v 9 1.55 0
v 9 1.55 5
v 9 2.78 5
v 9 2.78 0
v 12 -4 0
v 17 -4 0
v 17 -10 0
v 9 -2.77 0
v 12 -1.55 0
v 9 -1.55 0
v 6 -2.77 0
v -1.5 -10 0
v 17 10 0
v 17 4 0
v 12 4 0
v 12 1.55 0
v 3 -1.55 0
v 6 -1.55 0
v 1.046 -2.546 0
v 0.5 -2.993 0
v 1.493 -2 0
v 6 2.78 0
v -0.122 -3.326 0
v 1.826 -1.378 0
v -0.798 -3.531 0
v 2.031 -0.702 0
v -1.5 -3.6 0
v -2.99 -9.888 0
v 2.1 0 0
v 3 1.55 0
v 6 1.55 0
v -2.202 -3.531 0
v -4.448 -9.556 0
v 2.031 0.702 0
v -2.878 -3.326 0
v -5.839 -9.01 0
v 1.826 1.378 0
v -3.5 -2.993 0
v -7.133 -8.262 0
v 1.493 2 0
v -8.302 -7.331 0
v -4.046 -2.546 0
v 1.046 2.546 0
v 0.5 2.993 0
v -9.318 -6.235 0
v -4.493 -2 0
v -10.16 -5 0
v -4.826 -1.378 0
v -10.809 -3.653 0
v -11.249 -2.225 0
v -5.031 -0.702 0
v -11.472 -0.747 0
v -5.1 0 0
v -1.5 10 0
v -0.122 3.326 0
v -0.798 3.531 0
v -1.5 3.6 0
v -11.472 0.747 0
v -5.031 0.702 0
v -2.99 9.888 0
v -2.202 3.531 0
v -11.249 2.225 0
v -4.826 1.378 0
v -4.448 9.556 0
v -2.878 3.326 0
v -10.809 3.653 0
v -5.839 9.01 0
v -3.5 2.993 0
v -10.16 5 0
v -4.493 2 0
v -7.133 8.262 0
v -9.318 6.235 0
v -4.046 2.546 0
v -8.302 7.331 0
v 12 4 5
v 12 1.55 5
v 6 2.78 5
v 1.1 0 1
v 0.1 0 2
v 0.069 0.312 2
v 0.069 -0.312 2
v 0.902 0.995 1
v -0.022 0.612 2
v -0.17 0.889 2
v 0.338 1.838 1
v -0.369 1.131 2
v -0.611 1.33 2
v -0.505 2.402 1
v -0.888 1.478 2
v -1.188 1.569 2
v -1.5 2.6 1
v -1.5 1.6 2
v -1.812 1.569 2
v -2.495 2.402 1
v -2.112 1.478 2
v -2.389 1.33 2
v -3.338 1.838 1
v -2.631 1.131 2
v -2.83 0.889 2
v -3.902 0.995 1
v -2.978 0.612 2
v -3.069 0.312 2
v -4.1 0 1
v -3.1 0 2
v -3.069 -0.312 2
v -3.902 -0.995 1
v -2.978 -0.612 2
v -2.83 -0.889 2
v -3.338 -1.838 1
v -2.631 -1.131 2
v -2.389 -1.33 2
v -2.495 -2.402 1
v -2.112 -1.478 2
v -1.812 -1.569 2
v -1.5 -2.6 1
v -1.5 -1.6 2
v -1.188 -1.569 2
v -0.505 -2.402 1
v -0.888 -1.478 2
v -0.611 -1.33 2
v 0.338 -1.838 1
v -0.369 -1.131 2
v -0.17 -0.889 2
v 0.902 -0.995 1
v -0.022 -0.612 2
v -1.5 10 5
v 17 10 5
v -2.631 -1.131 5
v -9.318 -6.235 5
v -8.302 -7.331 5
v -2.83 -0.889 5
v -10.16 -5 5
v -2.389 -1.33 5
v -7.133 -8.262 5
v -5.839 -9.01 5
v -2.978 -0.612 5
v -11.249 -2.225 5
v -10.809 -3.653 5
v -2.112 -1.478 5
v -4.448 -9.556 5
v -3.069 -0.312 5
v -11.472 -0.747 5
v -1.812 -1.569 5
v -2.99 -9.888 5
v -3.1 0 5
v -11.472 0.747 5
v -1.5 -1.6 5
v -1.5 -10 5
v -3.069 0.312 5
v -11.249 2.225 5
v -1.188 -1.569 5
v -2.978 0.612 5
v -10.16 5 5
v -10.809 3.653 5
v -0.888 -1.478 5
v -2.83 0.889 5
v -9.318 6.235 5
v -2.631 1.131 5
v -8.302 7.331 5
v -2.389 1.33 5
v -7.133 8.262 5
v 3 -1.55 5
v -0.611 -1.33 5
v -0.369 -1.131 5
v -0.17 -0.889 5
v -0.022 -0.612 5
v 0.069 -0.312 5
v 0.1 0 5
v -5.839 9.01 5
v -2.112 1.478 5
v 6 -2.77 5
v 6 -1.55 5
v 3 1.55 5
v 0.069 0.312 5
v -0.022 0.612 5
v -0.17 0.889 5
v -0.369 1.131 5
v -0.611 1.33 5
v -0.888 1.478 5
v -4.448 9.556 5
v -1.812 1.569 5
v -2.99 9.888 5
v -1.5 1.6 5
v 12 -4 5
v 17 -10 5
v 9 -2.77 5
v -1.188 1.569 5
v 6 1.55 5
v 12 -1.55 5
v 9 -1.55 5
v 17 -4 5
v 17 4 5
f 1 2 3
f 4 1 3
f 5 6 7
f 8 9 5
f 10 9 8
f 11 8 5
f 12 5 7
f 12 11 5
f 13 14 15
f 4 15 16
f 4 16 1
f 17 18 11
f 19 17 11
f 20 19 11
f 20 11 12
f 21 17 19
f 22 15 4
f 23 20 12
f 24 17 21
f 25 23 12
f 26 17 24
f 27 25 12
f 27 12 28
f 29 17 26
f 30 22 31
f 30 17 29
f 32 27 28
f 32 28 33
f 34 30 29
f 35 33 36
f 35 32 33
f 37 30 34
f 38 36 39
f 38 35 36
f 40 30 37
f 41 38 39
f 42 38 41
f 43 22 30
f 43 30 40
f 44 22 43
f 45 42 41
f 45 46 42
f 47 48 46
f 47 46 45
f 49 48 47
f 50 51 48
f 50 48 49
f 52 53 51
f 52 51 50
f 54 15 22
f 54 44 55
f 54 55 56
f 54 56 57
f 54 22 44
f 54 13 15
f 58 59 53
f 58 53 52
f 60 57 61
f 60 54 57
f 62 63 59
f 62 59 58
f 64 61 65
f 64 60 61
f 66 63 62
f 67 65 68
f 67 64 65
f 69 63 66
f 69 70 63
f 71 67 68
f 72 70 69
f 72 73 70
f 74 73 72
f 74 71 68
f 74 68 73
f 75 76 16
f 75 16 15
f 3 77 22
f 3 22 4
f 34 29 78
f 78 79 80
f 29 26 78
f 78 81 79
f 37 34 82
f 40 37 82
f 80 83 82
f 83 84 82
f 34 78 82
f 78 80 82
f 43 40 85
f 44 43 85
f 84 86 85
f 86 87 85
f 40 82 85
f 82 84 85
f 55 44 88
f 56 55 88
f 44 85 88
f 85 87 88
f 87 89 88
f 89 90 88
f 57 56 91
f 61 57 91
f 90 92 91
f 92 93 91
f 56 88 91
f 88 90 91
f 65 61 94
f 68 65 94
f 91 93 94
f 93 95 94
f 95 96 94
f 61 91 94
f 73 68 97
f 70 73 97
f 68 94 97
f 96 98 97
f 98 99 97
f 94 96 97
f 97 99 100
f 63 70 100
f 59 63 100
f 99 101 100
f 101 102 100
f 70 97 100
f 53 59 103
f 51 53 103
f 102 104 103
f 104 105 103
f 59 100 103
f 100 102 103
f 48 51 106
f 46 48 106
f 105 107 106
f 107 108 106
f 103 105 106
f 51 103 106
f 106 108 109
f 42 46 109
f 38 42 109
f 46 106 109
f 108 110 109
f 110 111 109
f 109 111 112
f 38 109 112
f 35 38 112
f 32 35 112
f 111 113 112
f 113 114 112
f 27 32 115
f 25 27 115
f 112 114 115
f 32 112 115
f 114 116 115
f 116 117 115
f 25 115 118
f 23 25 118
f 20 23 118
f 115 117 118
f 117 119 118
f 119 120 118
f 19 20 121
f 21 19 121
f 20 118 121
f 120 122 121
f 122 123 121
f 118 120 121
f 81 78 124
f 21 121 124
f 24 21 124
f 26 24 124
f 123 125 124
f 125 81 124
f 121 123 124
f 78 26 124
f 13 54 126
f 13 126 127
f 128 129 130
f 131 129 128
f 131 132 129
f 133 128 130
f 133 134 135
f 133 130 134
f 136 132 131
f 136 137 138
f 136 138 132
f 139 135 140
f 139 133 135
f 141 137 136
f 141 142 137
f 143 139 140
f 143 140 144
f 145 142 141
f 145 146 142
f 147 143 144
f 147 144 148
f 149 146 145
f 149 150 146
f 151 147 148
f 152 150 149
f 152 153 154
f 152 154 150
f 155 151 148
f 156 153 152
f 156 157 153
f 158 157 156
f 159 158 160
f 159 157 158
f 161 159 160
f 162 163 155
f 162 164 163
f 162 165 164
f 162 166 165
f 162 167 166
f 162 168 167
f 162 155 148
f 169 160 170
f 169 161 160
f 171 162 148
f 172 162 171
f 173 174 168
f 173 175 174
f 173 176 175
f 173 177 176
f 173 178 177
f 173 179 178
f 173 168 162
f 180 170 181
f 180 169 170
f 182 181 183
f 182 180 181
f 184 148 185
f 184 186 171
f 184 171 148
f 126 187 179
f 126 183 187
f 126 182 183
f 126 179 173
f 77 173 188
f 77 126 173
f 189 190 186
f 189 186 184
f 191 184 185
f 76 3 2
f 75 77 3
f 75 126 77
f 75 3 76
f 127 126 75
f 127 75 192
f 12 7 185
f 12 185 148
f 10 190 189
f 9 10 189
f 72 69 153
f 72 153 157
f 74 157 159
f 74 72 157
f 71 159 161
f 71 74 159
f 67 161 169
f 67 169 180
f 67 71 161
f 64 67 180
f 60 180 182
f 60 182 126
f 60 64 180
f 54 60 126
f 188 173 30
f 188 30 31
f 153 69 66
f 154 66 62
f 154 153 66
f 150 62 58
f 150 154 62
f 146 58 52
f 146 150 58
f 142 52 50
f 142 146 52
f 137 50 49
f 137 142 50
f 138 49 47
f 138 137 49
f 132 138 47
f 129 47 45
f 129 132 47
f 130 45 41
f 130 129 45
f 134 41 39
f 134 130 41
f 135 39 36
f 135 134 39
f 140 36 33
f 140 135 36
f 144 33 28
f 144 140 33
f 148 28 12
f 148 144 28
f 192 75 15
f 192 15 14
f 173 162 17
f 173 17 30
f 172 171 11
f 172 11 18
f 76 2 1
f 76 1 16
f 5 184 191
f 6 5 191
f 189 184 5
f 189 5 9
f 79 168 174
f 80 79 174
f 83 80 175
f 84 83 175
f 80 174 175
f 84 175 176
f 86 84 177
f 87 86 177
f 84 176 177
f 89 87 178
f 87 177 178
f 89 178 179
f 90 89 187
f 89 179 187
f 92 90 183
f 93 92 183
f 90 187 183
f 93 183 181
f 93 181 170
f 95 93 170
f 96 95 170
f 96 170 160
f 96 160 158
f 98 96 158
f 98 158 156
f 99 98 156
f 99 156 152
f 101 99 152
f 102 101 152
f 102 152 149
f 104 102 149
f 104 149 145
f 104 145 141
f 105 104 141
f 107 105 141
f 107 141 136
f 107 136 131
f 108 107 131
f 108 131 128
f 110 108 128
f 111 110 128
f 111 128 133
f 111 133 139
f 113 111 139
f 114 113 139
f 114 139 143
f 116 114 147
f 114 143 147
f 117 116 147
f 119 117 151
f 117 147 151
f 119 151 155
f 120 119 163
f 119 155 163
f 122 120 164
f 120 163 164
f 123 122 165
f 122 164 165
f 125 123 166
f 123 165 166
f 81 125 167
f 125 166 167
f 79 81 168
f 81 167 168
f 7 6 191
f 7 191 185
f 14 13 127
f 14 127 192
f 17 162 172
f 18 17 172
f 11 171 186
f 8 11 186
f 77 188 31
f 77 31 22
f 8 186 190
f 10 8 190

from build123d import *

# Parameters (mm, degrees)
BOSS_EXTRU_1_DEPTH                  = 5
ESQUISSE2_W                         = 5
ESQUISSE2_H                         = 8
ENL_V_MAT_EXTRU_1_DEPTH             = 6
ENL_V_MAT_EXTRU_2_DEPTH             = 2.5
DIAM_TRE_DU_PER_AGE_2_5_2_5_2_D     = 2.5
DIAM_TRE_DU_PER_AGE_2_5_2_5_2_DEPTH = 2.5
ESQUISSE9_W                         = 8.5
ESQUISSE9_H                         = 10
BOSS_EXTRU_2_DEPTH                  = 5
ESQUISSE10_R                        = 1.6
ESQUISSE10_W                        = 9
ESQUISSE10_H                        = 3.1
ESQUISSE10_W_2                      = 3
ESQUISSE10_H_2                      = 5.55
ENL_V_MAT_EXTRU_3_DEPTH             = 6
CHANFREIN1_SIZE                     = 2


with BuildPart() as part:
    # Esquisse1 → Boss.-Extru.1 (new body)
    with BuildSketch(Plane(origin=(0, 0, 0), x_dir=(-1, 0, 0), z_dir=(0, 0, -1))):
        with BuildLine():
            Line((-17, 10), (-17, -10))
            Line((-17, -10), (1.5, -10))
            ThreePointArc((1.5, -10), (11.5, 0), (1.5, 10))
            Line((1.5, 10), (-17, 10))
        make_face()
    extrude(amount=-BOSS_EXTRU_1_DEPTH)

    # Esquisse2 → Enlèv. mat.-Extru.1 (cut, through all)
    with BuildSketch(Plane.XY.offset(5)):
        with Locations((14.5, 0)):
            Rectangle(ESQUISSE2_W, ESQUISSE2_H)
    extrude(amount=-ENL_V_MAT_EXTRU_1_DEPTH, mode=Mode.SUBTRACT)

    # Esquisse3 → Enlèv. mat.-Extru.2 (cut)
    with BuildSketch(Plane.XY.offset(5)):
        with BuildLine():
            Line((-10.160254038, -5), (7, -5))
            Line((7, -5), (7, 5))
            Line((7, 5), (-10.160254038, 5))
            ThreePointArc((-10.160254038, 5), (-11.5, 0), (-10.160254038, -5))
        make_face()
    extrude(amount=-ENL_V_MAT_EXTRU_2_DEPTH, mode=Mode.SUBTRACT)

    # Diamètre du perçage Ø2.5 (2.5)2
    with Locations(Plane.XY.offset(2.5)):
        with Locations((-1.5, 0)):
            Hole(DIAM_TRE_DU_PER_AGE_2_5_2_5_2_D / 2, depth=DIAM_TRE_DU_PER_AGE_2_5_2_5_2_DEPTH)

    # Esquisse9 → Boss.-Extru.2 (add)
    with BuildSketch(Plane.XY.offset(5)):
        with BuildLine():
            Line((-10.160254038, -5), (-1.5, -5))
            Line((-1.5, -5), (-1.5, 5))
            Line((-1.5, 5), (-10.160254038, 5))
            ThreePointArc((-10.160254038, 5), (-11.5, 0), (-10.160254038, -5))
        make_face()
        with Locations((2.75, 0)):
            Rectangle(ESQUISSE9_W, ESQUISSE9_H)
    extrude(amount=-BOSS_EXTRU_2_DEPTH)

    # Esquisse10 → Enlèv. mat.-Extru.3 (cut, through all)
    with BuildSketch(Plane.XY.offset(5)):
        with Locations((-1.5, 0)):
            Circle(ESQUISSE10_R)
        with Locations((7.5, 0)):
            Rectangle(ESQUISSE10_W, ESQUISSE10_H)
        with Locations((7.5, 0.005)):
            Rectangle(ESQUISSE10_W_2, ESQUISSE10_H_2)
    extrude(amount=-ENL_V_MAT_EXTRU_3_DEPTH, mode=Mode.SUBTRACT)

    # Chanfrein1
    chanfrein1_edges = [part.edges().sort_by_distance(p)[0] for p in [
        (-3.1, 0, 0),
    ]]
    chamfer(chanfrein1_edges, length=CHANFREIN1_SIZE)


solid = part.part
